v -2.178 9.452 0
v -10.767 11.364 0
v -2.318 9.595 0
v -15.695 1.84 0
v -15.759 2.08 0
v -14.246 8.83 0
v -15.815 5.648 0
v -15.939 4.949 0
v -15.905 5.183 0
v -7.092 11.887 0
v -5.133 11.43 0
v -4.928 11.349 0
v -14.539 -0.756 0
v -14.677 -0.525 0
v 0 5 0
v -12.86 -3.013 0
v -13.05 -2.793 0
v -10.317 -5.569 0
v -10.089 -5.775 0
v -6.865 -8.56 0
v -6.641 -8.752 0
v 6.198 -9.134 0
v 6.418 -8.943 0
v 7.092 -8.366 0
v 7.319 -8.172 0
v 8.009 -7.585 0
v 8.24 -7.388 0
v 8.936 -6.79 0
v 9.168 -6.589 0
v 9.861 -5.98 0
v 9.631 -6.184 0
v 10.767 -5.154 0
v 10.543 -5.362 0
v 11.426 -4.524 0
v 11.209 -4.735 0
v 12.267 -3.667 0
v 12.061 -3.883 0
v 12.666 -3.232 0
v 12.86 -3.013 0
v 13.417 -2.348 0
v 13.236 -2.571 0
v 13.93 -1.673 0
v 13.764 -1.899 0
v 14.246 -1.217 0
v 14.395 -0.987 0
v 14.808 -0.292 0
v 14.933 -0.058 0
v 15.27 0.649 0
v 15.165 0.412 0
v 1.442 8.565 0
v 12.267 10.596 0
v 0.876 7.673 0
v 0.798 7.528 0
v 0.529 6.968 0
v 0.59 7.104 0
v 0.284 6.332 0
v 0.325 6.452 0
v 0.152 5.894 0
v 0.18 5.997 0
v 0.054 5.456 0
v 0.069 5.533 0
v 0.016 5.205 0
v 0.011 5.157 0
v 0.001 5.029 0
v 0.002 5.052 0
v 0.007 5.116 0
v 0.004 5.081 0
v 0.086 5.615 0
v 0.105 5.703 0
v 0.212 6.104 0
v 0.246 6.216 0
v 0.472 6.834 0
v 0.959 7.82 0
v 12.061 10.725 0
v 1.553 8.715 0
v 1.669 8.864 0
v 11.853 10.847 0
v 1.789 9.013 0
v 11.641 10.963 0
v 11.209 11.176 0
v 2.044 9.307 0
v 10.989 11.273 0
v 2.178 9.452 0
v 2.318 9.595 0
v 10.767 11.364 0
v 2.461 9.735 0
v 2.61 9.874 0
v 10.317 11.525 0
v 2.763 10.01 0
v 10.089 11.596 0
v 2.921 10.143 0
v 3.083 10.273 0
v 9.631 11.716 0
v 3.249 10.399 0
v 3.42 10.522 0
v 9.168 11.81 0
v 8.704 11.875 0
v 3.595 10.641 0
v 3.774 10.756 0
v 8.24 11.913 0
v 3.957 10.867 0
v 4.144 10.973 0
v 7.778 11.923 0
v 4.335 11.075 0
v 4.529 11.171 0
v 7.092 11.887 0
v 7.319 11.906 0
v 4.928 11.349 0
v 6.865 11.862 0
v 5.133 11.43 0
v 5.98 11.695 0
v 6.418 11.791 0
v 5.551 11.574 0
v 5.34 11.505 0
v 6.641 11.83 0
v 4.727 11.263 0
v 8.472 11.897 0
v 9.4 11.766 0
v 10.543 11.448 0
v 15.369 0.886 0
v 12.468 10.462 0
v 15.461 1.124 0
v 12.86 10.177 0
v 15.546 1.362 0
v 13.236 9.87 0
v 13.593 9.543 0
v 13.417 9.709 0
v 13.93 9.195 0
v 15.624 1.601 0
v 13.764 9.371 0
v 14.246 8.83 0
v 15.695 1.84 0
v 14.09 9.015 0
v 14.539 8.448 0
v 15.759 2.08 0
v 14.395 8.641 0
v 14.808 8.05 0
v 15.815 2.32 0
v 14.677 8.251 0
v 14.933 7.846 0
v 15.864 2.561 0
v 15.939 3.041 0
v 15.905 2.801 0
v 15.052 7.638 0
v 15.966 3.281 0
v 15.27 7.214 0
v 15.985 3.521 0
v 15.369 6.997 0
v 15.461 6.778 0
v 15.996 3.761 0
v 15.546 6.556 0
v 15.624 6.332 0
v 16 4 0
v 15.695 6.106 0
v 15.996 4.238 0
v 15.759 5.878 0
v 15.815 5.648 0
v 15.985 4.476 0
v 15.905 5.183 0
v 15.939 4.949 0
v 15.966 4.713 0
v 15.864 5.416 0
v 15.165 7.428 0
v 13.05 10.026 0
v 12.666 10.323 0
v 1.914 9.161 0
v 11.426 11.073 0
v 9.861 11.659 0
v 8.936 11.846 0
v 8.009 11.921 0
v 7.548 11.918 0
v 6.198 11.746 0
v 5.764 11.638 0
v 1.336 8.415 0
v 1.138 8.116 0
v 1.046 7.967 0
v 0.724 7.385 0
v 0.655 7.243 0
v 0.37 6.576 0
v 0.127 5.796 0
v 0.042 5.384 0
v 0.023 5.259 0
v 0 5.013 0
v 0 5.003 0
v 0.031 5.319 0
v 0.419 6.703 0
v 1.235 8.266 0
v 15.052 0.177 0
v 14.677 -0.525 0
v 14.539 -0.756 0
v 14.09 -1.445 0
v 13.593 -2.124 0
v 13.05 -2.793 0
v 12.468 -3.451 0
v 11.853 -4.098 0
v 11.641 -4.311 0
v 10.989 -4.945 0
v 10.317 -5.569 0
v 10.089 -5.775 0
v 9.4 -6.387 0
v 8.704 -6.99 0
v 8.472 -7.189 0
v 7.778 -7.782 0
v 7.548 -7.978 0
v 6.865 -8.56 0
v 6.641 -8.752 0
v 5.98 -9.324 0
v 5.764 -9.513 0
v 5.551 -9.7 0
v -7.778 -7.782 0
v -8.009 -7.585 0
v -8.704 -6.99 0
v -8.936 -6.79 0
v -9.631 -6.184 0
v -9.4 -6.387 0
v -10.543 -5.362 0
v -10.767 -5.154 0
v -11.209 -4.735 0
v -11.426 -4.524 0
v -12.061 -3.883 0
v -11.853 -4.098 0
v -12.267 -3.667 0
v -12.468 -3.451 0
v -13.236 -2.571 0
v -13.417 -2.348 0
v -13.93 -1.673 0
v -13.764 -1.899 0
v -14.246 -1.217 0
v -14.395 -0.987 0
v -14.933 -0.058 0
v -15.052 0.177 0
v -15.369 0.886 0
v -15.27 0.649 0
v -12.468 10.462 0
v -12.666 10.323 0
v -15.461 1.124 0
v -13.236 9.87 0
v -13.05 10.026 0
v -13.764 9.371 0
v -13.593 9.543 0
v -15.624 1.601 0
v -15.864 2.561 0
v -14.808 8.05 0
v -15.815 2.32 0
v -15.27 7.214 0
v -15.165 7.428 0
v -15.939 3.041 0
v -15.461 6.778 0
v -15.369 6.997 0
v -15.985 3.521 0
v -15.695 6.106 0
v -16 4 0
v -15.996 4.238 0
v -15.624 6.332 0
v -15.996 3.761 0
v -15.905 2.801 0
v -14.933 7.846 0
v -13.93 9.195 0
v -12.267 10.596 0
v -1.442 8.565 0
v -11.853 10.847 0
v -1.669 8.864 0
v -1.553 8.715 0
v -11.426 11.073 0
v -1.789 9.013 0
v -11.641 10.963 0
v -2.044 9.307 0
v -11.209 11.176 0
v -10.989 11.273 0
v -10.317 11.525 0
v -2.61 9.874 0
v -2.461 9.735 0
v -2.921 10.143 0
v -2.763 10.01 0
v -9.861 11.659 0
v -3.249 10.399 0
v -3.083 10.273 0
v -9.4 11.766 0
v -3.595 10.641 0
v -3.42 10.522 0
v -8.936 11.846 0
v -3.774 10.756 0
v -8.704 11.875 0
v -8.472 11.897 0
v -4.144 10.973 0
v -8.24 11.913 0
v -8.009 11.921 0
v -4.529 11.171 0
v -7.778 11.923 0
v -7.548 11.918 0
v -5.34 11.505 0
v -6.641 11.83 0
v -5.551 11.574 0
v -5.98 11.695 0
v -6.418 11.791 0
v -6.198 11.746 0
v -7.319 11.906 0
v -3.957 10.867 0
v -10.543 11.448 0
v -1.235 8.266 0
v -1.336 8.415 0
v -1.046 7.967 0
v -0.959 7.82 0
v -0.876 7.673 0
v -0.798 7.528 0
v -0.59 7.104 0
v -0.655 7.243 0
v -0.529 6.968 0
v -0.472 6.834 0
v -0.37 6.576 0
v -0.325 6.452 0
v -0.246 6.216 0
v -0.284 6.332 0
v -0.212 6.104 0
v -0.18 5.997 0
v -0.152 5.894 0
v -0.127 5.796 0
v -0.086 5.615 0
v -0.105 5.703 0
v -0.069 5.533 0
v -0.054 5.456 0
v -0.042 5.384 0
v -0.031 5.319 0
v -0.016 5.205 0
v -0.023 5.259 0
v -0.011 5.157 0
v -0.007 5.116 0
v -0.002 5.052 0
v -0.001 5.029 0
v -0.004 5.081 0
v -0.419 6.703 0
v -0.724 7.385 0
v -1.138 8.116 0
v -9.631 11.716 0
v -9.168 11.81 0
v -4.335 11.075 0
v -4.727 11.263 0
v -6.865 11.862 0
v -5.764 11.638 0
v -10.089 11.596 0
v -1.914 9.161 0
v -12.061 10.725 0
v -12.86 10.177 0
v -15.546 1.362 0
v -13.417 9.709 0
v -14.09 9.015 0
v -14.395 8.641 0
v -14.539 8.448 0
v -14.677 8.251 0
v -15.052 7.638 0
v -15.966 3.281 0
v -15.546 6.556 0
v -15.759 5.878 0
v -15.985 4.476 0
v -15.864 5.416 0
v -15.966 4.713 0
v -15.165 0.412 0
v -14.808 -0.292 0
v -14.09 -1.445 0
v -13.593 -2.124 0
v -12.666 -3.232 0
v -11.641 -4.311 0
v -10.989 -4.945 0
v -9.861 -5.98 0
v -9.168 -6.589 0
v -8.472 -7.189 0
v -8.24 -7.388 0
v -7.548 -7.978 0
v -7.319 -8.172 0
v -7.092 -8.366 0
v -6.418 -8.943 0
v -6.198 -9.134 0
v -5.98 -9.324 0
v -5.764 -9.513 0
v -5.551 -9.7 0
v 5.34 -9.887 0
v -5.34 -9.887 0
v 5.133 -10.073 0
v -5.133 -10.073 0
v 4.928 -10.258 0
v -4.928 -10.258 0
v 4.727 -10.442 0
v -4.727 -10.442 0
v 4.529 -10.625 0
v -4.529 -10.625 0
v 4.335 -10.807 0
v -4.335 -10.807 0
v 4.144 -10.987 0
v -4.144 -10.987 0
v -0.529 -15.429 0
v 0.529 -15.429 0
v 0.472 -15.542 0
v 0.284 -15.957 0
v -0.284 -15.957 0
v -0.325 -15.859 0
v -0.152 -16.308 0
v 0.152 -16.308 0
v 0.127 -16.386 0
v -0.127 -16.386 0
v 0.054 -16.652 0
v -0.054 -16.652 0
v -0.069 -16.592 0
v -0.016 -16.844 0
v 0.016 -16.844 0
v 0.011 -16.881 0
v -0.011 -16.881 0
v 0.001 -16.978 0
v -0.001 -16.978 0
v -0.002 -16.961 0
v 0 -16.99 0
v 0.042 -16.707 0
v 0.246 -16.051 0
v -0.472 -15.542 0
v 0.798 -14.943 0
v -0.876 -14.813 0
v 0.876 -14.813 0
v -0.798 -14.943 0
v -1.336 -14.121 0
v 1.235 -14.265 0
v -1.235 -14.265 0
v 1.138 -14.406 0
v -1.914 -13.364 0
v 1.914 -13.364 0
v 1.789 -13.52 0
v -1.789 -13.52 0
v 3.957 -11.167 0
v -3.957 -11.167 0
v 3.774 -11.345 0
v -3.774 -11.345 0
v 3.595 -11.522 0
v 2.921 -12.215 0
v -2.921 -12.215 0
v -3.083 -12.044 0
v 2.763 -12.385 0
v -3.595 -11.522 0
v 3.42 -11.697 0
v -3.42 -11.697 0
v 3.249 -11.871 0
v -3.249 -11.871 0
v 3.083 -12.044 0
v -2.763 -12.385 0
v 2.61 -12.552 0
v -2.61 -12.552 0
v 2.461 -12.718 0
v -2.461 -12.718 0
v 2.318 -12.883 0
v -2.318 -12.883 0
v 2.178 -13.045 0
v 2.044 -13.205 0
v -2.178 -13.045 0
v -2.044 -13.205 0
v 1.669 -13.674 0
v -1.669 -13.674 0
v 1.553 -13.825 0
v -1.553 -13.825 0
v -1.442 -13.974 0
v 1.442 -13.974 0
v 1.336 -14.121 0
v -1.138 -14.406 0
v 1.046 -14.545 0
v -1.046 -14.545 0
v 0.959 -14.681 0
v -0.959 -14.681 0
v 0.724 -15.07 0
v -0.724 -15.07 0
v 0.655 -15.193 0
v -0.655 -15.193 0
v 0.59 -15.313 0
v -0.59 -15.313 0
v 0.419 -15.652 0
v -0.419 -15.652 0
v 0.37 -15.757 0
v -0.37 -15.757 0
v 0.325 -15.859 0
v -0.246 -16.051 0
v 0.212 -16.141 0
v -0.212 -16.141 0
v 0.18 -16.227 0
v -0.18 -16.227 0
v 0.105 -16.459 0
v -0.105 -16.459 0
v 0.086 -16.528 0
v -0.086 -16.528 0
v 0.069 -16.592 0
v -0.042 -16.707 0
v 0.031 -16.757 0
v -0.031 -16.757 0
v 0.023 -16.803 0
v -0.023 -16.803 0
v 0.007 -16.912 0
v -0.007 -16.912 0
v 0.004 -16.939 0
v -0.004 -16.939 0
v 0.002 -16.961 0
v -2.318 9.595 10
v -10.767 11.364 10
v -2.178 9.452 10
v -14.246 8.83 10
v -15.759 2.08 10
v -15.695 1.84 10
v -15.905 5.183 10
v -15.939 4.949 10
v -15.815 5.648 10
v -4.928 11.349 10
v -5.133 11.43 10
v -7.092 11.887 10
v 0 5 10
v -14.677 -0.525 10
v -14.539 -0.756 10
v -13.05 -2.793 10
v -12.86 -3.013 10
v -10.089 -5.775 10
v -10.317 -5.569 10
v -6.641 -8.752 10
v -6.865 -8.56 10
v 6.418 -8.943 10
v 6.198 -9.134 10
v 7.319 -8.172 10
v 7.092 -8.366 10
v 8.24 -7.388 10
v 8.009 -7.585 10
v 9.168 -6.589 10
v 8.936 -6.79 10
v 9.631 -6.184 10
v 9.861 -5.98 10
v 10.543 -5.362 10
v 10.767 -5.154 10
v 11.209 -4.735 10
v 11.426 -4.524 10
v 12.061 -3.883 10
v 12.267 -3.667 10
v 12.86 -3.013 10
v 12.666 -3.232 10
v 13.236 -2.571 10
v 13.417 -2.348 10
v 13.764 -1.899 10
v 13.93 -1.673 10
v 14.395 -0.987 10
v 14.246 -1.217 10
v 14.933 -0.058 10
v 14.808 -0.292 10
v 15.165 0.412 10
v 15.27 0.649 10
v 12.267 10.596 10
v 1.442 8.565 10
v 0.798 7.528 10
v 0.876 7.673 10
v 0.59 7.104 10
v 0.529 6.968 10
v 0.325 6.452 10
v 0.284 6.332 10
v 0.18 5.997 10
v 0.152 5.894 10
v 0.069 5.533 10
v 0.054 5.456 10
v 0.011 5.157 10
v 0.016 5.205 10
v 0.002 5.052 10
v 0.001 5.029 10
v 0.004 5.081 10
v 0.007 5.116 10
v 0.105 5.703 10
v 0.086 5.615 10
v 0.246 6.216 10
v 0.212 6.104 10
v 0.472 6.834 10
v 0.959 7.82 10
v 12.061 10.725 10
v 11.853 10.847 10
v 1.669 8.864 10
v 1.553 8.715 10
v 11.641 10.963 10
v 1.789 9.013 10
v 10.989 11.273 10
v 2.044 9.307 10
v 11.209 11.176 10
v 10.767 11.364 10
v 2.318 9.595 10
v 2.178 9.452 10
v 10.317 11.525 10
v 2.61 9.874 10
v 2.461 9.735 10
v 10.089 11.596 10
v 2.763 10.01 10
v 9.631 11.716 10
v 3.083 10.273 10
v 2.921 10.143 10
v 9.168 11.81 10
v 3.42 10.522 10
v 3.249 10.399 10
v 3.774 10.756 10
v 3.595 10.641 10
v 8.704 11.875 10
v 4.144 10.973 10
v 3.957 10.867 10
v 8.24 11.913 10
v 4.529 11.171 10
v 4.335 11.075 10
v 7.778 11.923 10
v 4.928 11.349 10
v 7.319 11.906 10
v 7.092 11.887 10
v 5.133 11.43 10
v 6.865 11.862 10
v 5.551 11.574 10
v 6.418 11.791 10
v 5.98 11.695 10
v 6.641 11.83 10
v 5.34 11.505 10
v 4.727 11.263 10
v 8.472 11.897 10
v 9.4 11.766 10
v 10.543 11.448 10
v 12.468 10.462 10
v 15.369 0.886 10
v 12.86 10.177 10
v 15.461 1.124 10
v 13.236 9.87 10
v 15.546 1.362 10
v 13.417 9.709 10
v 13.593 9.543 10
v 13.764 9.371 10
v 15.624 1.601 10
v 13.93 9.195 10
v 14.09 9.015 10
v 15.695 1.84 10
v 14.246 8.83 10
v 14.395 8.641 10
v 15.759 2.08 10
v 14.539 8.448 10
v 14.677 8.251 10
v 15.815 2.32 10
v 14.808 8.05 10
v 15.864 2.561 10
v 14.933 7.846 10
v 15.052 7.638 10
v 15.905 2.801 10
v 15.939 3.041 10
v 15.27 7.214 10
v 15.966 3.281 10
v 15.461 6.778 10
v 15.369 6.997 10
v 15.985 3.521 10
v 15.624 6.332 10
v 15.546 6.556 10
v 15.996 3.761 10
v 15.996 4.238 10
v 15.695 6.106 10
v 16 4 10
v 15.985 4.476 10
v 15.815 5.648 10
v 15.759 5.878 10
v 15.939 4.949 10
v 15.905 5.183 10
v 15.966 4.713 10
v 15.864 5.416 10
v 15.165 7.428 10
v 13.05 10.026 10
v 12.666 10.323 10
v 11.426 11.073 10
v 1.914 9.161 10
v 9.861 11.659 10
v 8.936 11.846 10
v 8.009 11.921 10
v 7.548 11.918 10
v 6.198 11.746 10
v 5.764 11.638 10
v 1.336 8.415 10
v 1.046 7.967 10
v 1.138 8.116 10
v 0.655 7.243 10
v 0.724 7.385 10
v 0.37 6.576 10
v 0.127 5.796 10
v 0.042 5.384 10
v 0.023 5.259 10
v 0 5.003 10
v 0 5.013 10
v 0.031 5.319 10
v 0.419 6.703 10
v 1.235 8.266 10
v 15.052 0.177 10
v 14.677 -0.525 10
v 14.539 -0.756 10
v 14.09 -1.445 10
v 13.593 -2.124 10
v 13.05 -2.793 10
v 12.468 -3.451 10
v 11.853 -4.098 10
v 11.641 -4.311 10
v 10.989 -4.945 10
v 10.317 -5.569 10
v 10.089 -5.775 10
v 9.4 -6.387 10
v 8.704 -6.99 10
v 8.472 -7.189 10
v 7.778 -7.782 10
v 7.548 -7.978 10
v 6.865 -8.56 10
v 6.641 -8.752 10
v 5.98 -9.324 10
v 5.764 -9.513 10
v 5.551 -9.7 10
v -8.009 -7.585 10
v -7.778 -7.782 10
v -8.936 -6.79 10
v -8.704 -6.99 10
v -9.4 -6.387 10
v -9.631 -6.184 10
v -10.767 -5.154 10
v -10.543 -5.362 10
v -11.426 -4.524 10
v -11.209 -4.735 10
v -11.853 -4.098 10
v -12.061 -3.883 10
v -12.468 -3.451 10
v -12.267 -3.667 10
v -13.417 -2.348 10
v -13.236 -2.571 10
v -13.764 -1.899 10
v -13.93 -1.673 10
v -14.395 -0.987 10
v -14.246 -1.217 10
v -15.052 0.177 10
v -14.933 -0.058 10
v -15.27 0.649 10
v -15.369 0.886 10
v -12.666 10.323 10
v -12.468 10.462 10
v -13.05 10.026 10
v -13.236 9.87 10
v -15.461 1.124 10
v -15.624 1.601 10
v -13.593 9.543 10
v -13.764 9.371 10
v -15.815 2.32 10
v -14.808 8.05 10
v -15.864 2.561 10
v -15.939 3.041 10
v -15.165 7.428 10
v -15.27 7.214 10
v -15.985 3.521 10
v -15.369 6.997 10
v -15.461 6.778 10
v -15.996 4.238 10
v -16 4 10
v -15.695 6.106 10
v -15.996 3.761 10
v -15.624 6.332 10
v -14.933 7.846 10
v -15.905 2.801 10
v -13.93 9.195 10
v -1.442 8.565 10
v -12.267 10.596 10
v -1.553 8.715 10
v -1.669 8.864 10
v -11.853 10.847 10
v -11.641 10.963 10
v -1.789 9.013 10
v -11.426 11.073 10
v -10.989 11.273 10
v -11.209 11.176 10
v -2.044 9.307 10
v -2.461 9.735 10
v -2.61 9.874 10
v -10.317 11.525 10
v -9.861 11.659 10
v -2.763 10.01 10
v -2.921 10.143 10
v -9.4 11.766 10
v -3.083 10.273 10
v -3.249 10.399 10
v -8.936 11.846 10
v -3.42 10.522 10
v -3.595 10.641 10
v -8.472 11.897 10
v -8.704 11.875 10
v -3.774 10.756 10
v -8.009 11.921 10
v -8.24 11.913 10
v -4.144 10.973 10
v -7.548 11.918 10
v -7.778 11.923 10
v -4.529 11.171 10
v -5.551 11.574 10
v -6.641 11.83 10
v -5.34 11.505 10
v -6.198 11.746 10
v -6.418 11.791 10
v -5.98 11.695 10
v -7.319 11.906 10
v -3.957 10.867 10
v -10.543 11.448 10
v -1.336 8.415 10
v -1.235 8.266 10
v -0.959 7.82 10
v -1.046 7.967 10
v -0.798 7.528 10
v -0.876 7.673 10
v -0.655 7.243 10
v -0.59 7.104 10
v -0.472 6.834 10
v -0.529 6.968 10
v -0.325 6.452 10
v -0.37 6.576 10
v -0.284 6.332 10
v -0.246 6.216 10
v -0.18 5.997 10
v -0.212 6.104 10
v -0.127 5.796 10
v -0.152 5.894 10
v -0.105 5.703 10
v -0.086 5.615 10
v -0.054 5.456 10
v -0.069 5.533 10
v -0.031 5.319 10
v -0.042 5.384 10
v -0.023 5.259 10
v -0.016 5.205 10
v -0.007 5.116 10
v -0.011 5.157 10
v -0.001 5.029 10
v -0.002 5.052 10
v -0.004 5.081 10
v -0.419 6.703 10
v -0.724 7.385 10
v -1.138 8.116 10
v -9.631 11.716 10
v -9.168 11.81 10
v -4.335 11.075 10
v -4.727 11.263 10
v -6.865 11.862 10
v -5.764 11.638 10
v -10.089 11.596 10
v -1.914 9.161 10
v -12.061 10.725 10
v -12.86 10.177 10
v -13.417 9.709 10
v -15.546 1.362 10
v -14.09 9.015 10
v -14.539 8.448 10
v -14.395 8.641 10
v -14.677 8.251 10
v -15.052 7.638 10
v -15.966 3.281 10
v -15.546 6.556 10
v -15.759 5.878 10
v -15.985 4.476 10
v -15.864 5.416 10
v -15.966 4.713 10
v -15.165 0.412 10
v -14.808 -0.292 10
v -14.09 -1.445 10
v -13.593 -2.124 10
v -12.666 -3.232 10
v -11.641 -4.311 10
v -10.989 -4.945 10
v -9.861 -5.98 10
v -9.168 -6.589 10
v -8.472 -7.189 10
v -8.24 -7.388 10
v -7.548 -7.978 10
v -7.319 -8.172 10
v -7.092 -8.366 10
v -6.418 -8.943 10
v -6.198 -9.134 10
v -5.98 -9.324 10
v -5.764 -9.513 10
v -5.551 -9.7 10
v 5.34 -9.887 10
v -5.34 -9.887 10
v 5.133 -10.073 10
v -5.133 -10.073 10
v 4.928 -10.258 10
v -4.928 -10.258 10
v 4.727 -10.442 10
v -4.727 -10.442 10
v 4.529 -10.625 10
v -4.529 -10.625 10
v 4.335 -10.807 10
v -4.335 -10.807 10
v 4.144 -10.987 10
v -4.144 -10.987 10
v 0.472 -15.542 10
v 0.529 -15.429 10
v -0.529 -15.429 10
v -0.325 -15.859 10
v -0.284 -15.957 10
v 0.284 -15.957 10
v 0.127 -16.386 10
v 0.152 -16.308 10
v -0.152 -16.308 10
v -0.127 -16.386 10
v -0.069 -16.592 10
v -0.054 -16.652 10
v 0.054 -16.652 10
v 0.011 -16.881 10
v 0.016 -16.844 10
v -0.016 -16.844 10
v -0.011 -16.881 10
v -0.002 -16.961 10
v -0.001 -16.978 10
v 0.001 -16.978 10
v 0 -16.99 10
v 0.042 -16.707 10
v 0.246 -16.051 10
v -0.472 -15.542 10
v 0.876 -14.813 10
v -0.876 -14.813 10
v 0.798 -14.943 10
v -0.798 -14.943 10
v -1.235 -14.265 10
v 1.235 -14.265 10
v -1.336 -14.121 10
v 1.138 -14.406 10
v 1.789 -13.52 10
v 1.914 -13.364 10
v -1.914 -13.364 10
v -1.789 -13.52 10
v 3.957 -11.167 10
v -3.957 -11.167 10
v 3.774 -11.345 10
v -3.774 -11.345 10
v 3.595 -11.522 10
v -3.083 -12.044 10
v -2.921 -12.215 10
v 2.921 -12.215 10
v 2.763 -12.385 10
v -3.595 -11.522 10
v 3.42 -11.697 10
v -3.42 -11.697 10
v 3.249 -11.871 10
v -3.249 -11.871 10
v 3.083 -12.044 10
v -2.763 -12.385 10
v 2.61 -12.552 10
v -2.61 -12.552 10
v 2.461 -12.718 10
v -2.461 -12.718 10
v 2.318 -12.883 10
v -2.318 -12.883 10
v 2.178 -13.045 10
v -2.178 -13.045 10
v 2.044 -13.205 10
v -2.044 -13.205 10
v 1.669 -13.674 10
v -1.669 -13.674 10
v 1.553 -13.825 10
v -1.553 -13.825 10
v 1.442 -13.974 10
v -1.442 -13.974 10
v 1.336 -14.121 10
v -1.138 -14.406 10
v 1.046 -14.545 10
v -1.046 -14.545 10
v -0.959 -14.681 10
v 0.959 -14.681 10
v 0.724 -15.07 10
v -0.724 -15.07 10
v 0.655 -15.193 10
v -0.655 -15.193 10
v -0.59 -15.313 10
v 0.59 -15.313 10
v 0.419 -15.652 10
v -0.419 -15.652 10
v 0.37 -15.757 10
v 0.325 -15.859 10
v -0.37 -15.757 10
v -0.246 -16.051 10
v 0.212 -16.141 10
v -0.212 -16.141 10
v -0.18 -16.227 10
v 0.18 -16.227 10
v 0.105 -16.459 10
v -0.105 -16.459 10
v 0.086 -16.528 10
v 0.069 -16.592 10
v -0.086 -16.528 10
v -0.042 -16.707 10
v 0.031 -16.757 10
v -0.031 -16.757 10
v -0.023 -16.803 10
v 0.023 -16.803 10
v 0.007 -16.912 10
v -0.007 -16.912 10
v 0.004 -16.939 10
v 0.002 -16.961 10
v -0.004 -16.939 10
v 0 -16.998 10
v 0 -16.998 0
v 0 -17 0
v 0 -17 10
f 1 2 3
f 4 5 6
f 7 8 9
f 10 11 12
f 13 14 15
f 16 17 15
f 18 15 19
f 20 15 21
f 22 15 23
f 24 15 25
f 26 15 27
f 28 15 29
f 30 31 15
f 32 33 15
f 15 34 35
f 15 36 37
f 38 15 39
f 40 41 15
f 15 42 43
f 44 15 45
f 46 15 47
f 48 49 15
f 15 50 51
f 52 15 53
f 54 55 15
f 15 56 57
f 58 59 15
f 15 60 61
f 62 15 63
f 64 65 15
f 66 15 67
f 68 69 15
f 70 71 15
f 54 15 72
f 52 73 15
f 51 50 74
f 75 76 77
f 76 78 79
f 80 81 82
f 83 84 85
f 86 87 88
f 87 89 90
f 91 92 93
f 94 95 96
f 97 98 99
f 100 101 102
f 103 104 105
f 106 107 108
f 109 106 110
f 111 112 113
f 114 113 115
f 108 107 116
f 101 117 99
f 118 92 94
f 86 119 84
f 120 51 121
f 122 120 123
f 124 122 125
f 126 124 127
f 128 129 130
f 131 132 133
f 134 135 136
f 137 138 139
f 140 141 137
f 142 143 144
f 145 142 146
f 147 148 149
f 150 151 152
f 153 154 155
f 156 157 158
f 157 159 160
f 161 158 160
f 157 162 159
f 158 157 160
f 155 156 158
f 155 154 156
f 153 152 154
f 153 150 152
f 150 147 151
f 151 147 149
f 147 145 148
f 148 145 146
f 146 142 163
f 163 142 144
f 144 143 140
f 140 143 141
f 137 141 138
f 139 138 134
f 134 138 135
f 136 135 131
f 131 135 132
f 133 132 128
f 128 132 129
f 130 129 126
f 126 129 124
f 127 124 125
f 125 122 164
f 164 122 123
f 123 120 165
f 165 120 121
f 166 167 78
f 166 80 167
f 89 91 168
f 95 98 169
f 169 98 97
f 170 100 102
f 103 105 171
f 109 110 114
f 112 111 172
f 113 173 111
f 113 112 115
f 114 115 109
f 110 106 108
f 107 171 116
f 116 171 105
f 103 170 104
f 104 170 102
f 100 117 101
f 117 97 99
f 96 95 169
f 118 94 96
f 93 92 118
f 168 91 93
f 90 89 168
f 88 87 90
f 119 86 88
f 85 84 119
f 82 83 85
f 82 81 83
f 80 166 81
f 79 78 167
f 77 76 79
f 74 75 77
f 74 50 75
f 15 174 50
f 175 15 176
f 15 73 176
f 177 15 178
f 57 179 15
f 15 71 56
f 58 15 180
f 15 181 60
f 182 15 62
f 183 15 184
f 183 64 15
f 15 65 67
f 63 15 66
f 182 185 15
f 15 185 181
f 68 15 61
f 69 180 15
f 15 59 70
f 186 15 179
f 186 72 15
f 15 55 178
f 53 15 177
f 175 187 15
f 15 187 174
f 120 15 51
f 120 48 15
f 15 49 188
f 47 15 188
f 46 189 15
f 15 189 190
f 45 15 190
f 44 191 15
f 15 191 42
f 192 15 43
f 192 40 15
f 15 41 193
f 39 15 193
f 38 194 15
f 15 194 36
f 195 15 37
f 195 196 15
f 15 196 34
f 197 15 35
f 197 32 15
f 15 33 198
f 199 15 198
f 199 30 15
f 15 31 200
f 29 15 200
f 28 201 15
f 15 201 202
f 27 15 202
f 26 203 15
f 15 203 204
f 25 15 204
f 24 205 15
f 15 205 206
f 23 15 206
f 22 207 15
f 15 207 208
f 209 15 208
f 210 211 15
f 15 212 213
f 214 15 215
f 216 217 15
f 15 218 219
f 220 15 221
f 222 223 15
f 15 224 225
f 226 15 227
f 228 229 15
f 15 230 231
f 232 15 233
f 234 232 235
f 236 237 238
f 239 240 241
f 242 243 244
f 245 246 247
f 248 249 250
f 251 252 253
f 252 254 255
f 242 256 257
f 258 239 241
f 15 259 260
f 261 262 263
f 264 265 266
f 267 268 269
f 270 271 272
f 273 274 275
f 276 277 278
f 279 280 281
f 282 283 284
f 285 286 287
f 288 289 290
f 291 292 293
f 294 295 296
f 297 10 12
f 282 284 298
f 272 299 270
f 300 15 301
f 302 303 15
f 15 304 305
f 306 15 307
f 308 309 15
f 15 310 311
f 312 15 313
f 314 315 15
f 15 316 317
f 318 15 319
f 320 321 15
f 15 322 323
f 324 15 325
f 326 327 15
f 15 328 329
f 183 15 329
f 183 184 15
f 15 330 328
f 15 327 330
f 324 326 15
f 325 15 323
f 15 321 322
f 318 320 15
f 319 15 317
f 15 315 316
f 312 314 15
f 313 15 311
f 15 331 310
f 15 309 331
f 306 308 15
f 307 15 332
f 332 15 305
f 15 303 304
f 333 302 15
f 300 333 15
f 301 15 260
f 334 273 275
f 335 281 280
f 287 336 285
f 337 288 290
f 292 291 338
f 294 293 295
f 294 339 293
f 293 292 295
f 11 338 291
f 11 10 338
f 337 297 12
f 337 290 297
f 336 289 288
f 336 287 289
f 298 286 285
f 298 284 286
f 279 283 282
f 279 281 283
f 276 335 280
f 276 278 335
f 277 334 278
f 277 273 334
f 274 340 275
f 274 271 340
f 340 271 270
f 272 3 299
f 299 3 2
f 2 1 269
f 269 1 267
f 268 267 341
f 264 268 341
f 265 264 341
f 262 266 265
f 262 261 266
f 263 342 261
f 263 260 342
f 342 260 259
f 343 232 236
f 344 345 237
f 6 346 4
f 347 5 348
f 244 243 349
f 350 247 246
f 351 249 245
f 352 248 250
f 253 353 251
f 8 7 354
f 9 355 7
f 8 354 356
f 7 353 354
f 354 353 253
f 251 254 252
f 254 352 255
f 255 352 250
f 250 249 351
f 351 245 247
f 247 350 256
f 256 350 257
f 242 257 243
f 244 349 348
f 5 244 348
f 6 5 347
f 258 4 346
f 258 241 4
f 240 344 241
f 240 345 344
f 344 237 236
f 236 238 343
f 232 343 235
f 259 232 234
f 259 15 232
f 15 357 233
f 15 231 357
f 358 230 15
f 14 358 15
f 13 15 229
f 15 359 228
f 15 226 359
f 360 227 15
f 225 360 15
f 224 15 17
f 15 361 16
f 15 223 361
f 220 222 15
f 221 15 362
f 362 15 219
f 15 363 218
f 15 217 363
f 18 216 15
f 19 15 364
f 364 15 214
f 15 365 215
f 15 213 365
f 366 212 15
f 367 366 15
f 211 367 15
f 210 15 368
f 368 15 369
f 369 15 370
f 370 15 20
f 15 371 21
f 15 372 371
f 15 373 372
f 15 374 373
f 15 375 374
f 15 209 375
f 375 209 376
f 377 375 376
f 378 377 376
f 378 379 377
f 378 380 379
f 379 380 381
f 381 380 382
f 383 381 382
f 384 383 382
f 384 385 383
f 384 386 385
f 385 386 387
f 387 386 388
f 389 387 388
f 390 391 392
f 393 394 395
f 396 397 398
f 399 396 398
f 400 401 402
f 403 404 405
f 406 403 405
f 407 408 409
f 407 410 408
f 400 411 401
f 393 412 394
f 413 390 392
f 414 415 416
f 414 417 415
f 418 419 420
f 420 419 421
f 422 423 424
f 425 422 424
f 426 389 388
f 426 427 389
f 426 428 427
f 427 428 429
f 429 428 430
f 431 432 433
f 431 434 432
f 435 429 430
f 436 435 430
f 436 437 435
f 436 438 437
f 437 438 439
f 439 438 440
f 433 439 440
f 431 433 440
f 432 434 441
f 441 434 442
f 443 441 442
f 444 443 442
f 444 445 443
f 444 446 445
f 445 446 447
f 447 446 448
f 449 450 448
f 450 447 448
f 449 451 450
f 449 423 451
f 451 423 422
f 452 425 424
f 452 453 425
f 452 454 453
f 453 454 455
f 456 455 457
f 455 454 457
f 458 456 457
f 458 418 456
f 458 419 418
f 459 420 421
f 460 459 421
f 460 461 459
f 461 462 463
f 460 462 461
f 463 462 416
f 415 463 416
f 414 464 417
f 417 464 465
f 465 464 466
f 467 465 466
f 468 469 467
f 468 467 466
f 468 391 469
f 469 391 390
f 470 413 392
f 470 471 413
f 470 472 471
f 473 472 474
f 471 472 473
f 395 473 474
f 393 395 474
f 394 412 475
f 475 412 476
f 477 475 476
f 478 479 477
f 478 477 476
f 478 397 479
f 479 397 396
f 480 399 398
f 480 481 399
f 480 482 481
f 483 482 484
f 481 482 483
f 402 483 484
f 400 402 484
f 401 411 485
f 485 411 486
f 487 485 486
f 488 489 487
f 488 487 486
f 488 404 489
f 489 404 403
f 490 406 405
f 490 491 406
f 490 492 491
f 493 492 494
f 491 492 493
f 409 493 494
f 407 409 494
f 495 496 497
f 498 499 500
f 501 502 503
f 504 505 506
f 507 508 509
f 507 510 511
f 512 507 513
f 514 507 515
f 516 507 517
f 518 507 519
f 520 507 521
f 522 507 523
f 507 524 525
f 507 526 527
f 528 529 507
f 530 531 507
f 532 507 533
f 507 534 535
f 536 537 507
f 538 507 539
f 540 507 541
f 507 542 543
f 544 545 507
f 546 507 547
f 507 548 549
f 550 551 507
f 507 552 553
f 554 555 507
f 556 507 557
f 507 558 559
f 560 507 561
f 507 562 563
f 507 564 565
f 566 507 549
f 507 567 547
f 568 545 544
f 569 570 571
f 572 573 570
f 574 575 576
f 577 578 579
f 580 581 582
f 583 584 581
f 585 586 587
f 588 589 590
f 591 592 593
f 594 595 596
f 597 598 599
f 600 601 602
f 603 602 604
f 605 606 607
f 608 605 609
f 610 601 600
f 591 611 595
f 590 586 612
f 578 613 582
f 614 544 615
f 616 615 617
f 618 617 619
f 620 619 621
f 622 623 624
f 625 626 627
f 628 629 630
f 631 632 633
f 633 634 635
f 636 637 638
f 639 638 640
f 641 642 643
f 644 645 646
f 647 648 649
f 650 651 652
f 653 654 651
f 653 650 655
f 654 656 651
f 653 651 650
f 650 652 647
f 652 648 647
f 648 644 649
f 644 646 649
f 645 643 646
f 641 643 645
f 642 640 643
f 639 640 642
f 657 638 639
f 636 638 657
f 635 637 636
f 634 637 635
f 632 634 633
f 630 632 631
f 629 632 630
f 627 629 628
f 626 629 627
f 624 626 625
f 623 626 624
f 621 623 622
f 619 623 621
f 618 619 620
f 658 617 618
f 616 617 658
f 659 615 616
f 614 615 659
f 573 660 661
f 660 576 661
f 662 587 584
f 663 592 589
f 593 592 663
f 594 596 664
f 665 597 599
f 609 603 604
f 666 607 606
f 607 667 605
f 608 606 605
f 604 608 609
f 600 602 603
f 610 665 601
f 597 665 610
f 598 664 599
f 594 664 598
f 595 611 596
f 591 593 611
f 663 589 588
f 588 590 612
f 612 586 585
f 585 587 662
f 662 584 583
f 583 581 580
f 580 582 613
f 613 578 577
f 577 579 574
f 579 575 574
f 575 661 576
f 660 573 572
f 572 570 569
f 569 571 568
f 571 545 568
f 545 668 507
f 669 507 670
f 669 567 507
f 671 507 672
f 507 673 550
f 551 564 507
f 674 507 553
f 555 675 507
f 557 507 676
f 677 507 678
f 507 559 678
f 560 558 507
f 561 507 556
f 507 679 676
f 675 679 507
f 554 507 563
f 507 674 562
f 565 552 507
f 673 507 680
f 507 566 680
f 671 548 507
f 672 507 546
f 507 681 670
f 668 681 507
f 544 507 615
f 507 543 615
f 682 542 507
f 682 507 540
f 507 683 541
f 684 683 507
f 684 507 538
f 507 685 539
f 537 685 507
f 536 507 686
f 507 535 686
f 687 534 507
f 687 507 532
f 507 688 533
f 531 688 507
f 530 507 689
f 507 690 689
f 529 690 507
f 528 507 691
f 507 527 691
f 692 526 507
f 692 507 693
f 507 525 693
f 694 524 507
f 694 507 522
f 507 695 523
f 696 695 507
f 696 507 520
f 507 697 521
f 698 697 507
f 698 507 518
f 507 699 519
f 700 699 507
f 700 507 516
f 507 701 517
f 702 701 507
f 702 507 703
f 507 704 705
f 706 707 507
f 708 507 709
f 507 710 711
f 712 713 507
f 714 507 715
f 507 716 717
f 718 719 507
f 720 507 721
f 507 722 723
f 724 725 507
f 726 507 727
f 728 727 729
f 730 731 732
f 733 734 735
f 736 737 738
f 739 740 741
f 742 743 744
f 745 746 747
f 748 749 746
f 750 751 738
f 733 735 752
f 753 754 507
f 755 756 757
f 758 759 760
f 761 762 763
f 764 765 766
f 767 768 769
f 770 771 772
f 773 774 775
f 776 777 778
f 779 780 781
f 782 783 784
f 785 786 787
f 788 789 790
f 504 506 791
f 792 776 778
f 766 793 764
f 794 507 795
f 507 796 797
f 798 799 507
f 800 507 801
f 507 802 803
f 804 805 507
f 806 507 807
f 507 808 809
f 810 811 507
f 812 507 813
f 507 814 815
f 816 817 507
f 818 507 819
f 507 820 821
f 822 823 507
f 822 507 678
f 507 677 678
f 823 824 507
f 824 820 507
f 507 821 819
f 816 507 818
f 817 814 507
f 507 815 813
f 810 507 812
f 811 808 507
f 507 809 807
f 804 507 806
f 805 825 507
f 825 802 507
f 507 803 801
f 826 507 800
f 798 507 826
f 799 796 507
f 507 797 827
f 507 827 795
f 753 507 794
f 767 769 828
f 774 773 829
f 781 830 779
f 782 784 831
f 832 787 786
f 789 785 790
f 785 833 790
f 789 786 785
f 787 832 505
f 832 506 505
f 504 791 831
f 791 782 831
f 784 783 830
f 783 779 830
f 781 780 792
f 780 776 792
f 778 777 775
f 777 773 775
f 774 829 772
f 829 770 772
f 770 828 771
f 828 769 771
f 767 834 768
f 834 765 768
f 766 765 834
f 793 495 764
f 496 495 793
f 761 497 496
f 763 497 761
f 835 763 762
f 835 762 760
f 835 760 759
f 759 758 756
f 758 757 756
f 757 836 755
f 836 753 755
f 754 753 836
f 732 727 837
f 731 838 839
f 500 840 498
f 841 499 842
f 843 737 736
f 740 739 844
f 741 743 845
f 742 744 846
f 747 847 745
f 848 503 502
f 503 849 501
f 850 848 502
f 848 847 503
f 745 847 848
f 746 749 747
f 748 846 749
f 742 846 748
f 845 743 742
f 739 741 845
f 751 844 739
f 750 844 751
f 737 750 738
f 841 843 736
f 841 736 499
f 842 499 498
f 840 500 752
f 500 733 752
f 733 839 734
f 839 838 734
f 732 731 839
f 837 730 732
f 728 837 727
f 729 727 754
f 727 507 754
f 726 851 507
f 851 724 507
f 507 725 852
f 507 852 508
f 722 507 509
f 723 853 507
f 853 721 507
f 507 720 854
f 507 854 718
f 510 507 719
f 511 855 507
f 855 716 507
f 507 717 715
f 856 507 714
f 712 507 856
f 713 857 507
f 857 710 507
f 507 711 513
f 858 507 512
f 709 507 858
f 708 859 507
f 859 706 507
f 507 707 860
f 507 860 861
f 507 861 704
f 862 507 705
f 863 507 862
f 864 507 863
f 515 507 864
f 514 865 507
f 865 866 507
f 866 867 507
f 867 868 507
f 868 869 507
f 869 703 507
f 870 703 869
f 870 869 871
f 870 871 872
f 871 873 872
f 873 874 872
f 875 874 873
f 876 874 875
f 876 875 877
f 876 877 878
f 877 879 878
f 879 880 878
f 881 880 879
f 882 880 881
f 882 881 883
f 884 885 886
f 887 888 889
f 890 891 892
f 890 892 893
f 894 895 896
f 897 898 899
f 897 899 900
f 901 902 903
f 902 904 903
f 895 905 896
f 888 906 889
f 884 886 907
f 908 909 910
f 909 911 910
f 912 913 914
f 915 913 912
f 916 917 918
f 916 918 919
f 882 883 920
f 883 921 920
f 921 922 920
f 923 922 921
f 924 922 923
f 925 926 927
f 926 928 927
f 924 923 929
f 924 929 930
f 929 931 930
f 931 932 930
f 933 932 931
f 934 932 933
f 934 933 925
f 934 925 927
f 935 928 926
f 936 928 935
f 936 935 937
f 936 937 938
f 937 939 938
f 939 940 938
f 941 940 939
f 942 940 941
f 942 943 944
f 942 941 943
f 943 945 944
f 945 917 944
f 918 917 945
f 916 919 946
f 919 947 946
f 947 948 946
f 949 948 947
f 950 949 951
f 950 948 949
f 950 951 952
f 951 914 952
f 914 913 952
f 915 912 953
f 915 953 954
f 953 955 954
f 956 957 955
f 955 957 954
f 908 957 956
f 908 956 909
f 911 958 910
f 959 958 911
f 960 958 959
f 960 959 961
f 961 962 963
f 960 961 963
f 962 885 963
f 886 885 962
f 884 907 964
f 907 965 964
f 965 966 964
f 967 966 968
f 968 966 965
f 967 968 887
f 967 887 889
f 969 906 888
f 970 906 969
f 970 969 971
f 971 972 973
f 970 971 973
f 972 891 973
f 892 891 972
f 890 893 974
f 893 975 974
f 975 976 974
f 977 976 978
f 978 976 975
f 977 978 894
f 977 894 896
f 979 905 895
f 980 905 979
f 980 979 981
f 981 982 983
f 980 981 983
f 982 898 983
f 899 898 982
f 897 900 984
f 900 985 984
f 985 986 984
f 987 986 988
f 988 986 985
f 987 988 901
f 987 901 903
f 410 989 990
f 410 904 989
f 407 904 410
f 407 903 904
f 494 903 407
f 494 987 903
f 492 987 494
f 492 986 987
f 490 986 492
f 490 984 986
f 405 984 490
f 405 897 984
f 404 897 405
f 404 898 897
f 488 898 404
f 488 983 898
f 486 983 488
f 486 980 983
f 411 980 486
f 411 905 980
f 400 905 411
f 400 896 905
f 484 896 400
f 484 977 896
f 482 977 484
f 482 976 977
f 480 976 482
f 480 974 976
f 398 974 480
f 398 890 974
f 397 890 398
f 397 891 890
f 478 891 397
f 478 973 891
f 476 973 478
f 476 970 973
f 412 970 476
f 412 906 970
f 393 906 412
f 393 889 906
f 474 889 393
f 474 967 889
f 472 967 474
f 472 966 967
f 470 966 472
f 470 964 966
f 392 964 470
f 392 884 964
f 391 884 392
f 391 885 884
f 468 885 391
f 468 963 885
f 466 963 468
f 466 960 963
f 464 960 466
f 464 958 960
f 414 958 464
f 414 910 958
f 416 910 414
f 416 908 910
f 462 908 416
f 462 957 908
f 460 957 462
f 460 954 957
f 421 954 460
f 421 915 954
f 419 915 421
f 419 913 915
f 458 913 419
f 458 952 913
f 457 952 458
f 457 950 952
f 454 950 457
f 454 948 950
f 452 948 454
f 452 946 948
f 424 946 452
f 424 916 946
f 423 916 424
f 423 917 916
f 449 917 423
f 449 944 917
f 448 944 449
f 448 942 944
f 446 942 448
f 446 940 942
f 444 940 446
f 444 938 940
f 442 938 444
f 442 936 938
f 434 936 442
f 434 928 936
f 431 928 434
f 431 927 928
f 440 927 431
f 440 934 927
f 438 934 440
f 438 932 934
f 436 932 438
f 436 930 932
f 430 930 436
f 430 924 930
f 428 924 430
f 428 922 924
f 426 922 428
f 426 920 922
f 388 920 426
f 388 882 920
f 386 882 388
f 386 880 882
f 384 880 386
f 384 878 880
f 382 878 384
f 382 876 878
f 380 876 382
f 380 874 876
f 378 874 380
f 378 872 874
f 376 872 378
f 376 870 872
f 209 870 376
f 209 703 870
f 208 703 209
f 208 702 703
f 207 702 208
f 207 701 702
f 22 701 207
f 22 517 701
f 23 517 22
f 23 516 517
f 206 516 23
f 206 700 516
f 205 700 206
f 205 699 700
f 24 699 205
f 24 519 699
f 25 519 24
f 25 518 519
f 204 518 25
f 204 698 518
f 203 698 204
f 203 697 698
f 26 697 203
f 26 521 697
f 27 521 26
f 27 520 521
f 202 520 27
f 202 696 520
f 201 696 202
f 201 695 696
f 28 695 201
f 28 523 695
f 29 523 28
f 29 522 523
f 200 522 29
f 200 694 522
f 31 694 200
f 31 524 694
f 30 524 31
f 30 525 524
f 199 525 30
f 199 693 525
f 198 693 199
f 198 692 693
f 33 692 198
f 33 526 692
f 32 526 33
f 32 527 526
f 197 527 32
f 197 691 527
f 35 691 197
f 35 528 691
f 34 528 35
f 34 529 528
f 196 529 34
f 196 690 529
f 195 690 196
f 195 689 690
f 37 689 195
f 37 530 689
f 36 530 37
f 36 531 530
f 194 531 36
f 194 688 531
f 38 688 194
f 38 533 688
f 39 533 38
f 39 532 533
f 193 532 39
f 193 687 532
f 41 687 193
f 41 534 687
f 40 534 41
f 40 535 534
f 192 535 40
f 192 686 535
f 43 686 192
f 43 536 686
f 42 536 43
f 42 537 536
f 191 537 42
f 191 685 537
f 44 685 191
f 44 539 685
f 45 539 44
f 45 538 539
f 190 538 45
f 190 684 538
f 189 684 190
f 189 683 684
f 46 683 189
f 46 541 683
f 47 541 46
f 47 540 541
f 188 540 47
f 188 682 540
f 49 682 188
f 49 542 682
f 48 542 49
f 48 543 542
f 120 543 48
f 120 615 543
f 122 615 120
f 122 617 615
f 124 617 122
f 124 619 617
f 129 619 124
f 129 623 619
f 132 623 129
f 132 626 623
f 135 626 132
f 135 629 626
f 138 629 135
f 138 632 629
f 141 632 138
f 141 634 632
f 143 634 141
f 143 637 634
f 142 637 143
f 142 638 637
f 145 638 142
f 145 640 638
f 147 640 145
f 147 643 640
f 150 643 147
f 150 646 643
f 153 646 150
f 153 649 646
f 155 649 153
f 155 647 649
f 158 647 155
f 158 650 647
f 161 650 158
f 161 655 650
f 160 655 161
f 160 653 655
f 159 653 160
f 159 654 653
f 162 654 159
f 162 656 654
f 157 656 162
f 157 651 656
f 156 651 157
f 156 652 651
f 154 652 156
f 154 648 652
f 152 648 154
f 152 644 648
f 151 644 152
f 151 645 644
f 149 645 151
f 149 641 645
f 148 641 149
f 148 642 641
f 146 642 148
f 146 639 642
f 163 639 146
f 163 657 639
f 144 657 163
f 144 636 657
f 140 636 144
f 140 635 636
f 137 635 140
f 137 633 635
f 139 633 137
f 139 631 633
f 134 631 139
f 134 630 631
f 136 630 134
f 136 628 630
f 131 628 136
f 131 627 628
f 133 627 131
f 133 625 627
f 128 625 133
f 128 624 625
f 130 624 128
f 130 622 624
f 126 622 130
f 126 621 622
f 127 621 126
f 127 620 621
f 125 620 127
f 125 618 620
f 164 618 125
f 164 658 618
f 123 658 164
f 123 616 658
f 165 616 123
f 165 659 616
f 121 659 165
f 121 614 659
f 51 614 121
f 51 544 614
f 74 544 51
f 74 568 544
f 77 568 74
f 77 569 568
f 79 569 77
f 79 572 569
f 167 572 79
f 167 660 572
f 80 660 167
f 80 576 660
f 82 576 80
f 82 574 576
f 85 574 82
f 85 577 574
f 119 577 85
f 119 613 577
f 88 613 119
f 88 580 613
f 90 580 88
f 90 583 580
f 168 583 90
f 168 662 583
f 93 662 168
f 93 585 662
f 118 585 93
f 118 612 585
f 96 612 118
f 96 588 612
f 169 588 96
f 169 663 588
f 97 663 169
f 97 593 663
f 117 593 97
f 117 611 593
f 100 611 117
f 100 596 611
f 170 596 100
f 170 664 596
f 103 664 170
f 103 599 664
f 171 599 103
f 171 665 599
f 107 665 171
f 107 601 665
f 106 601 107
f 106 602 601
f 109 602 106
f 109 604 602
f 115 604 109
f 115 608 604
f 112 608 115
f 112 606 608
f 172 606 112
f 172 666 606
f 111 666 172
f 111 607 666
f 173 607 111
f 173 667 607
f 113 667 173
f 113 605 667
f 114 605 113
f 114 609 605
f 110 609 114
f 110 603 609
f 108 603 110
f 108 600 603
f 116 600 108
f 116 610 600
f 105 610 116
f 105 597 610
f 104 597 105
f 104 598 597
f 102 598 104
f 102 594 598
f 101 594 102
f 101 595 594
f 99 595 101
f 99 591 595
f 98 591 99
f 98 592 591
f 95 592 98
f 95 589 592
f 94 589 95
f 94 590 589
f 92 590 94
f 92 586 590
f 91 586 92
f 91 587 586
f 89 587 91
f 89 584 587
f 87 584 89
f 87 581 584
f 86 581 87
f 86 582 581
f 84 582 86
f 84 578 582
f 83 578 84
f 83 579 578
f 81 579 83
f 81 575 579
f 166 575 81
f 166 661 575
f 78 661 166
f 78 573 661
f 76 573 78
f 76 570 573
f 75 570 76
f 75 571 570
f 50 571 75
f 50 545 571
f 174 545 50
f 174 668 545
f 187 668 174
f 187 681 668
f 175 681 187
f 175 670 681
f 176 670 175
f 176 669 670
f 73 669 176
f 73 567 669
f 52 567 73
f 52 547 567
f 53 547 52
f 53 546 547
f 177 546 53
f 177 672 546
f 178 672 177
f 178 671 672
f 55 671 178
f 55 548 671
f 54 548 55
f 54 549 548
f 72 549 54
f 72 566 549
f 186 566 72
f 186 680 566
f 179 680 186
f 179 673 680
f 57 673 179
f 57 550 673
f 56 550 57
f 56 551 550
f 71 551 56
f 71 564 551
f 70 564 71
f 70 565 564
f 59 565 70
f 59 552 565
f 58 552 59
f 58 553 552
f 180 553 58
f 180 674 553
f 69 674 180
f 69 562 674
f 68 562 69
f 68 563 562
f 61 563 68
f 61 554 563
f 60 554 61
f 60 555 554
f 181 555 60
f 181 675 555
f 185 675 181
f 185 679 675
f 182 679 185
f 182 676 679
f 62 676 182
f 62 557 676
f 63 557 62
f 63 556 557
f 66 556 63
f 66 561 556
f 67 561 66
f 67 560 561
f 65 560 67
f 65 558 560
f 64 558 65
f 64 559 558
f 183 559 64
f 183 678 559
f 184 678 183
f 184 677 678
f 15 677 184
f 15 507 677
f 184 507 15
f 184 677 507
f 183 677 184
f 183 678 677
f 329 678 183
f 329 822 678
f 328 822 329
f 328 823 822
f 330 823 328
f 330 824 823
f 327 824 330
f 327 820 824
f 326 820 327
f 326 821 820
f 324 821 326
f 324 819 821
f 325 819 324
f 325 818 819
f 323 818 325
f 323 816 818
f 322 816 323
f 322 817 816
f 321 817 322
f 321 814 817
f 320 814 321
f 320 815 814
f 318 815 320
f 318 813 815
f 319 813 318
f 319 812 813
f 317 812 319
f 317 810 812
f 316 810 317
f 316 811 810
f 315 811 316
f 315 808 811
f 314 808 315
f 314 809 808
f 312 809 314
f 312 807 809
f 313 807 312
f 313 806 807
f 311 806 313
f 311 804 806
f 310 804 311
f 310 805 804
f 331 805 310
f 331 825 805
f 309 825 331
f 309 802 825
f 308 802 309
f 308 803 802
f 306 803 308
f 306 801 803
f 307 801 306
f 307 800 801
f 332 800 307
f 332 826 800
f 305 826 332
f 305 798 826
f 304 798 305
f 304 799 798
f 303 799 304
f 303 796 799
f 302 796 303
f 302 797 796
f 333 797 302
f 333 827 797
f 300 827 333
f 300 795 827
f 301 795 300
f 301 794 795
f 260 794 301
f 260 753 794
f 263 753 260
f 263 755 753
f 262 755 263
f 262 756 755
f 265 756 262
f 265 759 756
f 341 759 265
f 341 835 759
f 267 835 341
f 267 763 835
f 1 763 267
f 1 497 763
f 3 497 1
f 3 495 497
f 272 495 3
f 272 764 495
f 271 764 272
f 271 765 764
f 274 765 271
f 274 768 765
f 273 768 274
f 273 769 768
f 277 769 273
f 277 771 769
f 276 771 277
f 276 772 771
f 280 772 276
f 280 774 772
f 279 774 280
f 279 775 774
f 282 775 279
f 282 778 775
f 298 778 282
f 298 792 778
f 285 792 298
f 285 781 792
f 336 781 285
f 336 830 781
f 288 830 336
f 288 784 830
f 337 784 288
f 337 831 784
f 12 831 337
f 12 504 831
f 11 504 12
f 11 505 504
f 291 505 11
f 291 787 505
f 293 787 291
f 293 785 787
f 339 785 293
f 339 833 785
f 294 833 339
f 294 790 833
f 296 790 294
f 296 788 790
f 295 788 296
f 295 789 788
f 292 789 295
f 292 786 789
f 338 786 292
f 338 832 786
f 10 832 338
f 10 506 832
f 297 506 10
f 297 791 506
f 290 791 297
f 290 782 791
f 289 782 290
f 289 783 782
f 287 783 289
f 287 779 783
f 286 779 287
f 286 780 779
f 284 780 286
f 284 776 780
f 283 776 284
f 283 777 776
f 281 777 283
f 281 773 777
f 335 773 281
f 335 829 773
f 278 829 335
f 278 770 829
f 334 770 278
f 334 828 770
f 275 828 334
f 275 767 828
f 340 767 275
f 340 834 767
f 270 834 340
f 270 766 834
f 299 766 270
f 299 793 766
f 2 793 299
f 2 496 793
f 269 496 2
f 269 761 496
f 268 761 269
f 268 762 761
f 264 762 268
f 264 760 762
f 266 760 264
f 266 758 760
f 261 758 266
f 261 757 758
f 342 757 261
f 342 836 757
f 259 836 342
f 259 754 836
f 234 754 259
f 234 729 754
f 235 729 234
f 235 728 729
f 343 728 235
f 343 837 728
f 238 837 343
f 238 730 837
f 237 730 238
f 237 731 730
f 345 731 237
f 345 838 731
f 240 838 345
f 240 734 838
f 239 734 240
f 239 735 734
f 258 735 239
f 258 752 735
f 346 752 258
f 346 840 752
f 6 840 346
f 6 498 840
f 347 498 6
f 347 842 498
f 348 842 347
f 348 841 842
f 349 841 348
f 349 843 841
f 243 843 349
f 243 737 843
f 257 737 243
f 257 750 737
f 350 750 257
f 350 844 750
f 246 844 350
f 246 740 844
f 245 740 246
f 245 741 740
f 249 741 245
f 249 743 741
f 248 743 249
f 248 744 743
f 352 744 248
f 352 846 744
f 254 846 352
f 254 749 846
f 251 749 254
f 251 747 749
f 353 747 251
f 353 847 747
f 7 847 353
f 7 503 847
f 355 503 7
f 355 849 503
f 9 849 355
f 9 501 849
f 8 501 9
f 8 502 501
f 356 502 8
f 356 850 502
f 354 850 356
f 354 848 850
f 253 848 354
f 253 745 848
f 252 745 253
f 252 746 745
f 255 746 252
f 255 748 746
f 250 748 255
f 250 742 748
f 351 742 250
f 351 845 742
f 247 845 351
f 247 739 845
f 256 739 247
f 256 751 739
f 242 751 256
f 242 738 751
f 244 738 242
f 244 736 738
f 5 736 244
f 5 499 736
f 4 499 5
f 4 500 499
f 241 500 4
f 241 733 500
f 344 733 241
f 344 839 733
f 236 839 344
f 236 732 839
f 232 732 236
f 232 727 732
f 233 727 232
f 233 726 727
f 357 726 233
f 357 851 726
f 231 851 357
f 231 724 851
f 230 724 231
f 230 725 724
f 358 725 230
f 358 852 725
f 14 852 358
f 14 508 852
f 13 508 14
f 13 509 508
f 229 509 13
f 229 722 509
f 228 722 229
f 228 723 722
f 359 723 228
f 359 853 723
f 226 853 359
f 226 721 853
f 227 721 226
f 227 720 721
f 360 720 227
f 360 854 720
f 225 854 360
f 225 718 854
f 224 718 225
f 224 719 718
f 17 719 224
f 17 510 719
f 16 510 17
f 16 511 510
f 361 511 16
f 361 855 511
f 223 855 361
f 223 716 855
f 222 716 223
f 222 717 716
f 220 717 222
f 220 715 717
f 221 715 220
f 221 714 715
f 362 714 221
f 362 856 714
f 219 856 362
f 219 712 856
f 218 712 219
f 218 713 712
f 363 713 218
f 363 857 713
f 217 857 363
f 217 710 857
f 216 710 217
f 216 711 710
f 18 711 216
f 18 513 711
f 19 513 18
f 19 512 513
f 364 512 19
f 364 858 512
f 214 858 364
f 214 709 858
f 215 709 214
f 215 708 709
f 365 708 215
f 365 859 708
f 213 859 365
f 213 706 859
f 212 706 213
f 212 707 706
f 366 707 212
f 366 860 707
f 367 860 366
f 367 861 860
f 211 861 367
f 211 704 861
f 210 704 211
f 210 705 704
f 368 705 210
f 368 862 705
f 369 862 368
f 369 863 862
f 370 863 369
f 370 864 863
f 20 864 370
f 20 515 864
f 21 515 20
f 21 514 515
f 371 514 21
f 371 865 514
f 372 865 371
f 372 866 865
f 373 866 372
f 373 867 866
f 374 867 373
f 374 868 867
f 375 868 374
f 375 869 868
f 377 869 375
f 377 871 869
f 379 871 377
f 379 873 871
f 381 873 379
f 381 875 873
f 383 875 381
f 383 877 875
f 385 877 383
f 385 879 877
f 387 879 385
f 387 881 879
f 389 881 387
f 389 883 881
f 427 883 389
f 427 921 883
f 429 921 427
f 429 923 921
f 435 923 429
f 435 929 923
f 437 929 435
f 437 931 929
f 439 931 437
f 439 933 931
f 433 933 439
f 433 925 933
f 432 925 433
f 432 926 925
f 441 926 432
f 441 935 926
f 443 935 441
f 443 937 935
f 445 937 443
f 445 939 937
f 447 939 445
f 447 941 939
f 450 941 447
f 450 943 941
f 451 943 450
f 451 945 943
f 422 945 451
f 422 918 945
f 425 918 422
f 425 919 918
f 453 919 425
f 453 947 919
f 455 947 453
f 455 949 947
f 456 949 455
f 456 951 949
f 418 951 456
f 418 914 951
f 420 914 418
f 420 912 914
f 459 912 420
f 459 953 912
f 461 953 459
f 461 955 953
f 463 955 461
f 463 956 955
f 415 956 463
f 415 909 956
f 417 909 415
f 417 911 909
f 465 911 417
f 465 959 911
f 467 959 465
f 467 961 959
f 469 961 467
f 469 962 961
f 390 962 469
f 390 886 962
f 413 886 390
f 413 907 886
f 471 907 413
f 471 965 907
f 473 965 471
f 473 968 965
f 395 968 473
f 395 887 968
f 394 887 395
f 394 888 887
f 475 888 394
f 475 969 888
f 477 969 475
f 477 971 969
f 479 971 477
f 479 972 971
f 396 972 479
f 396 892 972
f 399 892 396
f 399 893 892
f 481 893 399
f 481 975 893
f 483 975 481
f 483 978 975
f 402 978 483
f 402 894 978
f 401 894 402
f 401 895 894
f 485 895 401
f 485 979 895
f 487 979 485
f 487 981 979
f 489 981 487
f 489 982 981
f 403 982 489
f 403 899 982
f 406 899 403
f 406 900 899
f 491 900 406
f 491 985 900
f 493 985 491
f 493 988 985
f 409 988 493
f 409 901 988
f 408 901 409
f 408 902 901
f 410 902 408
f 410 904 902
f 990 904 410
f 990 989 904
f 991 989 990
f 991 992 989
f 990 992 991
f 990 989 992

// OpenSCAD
n = 500;
h = 10;
step = 360/n;
function heart_coordinates(t) = [16*pow(sin(t),3), 13*cos(t) - 5*cos(2*t) - 2*cos(3*t) - cos(4*t)];
points = [ for (t=[0:step:359.999]) heart_coordinates(t)];
linear_extrude(height=h)
    polygon(points);
